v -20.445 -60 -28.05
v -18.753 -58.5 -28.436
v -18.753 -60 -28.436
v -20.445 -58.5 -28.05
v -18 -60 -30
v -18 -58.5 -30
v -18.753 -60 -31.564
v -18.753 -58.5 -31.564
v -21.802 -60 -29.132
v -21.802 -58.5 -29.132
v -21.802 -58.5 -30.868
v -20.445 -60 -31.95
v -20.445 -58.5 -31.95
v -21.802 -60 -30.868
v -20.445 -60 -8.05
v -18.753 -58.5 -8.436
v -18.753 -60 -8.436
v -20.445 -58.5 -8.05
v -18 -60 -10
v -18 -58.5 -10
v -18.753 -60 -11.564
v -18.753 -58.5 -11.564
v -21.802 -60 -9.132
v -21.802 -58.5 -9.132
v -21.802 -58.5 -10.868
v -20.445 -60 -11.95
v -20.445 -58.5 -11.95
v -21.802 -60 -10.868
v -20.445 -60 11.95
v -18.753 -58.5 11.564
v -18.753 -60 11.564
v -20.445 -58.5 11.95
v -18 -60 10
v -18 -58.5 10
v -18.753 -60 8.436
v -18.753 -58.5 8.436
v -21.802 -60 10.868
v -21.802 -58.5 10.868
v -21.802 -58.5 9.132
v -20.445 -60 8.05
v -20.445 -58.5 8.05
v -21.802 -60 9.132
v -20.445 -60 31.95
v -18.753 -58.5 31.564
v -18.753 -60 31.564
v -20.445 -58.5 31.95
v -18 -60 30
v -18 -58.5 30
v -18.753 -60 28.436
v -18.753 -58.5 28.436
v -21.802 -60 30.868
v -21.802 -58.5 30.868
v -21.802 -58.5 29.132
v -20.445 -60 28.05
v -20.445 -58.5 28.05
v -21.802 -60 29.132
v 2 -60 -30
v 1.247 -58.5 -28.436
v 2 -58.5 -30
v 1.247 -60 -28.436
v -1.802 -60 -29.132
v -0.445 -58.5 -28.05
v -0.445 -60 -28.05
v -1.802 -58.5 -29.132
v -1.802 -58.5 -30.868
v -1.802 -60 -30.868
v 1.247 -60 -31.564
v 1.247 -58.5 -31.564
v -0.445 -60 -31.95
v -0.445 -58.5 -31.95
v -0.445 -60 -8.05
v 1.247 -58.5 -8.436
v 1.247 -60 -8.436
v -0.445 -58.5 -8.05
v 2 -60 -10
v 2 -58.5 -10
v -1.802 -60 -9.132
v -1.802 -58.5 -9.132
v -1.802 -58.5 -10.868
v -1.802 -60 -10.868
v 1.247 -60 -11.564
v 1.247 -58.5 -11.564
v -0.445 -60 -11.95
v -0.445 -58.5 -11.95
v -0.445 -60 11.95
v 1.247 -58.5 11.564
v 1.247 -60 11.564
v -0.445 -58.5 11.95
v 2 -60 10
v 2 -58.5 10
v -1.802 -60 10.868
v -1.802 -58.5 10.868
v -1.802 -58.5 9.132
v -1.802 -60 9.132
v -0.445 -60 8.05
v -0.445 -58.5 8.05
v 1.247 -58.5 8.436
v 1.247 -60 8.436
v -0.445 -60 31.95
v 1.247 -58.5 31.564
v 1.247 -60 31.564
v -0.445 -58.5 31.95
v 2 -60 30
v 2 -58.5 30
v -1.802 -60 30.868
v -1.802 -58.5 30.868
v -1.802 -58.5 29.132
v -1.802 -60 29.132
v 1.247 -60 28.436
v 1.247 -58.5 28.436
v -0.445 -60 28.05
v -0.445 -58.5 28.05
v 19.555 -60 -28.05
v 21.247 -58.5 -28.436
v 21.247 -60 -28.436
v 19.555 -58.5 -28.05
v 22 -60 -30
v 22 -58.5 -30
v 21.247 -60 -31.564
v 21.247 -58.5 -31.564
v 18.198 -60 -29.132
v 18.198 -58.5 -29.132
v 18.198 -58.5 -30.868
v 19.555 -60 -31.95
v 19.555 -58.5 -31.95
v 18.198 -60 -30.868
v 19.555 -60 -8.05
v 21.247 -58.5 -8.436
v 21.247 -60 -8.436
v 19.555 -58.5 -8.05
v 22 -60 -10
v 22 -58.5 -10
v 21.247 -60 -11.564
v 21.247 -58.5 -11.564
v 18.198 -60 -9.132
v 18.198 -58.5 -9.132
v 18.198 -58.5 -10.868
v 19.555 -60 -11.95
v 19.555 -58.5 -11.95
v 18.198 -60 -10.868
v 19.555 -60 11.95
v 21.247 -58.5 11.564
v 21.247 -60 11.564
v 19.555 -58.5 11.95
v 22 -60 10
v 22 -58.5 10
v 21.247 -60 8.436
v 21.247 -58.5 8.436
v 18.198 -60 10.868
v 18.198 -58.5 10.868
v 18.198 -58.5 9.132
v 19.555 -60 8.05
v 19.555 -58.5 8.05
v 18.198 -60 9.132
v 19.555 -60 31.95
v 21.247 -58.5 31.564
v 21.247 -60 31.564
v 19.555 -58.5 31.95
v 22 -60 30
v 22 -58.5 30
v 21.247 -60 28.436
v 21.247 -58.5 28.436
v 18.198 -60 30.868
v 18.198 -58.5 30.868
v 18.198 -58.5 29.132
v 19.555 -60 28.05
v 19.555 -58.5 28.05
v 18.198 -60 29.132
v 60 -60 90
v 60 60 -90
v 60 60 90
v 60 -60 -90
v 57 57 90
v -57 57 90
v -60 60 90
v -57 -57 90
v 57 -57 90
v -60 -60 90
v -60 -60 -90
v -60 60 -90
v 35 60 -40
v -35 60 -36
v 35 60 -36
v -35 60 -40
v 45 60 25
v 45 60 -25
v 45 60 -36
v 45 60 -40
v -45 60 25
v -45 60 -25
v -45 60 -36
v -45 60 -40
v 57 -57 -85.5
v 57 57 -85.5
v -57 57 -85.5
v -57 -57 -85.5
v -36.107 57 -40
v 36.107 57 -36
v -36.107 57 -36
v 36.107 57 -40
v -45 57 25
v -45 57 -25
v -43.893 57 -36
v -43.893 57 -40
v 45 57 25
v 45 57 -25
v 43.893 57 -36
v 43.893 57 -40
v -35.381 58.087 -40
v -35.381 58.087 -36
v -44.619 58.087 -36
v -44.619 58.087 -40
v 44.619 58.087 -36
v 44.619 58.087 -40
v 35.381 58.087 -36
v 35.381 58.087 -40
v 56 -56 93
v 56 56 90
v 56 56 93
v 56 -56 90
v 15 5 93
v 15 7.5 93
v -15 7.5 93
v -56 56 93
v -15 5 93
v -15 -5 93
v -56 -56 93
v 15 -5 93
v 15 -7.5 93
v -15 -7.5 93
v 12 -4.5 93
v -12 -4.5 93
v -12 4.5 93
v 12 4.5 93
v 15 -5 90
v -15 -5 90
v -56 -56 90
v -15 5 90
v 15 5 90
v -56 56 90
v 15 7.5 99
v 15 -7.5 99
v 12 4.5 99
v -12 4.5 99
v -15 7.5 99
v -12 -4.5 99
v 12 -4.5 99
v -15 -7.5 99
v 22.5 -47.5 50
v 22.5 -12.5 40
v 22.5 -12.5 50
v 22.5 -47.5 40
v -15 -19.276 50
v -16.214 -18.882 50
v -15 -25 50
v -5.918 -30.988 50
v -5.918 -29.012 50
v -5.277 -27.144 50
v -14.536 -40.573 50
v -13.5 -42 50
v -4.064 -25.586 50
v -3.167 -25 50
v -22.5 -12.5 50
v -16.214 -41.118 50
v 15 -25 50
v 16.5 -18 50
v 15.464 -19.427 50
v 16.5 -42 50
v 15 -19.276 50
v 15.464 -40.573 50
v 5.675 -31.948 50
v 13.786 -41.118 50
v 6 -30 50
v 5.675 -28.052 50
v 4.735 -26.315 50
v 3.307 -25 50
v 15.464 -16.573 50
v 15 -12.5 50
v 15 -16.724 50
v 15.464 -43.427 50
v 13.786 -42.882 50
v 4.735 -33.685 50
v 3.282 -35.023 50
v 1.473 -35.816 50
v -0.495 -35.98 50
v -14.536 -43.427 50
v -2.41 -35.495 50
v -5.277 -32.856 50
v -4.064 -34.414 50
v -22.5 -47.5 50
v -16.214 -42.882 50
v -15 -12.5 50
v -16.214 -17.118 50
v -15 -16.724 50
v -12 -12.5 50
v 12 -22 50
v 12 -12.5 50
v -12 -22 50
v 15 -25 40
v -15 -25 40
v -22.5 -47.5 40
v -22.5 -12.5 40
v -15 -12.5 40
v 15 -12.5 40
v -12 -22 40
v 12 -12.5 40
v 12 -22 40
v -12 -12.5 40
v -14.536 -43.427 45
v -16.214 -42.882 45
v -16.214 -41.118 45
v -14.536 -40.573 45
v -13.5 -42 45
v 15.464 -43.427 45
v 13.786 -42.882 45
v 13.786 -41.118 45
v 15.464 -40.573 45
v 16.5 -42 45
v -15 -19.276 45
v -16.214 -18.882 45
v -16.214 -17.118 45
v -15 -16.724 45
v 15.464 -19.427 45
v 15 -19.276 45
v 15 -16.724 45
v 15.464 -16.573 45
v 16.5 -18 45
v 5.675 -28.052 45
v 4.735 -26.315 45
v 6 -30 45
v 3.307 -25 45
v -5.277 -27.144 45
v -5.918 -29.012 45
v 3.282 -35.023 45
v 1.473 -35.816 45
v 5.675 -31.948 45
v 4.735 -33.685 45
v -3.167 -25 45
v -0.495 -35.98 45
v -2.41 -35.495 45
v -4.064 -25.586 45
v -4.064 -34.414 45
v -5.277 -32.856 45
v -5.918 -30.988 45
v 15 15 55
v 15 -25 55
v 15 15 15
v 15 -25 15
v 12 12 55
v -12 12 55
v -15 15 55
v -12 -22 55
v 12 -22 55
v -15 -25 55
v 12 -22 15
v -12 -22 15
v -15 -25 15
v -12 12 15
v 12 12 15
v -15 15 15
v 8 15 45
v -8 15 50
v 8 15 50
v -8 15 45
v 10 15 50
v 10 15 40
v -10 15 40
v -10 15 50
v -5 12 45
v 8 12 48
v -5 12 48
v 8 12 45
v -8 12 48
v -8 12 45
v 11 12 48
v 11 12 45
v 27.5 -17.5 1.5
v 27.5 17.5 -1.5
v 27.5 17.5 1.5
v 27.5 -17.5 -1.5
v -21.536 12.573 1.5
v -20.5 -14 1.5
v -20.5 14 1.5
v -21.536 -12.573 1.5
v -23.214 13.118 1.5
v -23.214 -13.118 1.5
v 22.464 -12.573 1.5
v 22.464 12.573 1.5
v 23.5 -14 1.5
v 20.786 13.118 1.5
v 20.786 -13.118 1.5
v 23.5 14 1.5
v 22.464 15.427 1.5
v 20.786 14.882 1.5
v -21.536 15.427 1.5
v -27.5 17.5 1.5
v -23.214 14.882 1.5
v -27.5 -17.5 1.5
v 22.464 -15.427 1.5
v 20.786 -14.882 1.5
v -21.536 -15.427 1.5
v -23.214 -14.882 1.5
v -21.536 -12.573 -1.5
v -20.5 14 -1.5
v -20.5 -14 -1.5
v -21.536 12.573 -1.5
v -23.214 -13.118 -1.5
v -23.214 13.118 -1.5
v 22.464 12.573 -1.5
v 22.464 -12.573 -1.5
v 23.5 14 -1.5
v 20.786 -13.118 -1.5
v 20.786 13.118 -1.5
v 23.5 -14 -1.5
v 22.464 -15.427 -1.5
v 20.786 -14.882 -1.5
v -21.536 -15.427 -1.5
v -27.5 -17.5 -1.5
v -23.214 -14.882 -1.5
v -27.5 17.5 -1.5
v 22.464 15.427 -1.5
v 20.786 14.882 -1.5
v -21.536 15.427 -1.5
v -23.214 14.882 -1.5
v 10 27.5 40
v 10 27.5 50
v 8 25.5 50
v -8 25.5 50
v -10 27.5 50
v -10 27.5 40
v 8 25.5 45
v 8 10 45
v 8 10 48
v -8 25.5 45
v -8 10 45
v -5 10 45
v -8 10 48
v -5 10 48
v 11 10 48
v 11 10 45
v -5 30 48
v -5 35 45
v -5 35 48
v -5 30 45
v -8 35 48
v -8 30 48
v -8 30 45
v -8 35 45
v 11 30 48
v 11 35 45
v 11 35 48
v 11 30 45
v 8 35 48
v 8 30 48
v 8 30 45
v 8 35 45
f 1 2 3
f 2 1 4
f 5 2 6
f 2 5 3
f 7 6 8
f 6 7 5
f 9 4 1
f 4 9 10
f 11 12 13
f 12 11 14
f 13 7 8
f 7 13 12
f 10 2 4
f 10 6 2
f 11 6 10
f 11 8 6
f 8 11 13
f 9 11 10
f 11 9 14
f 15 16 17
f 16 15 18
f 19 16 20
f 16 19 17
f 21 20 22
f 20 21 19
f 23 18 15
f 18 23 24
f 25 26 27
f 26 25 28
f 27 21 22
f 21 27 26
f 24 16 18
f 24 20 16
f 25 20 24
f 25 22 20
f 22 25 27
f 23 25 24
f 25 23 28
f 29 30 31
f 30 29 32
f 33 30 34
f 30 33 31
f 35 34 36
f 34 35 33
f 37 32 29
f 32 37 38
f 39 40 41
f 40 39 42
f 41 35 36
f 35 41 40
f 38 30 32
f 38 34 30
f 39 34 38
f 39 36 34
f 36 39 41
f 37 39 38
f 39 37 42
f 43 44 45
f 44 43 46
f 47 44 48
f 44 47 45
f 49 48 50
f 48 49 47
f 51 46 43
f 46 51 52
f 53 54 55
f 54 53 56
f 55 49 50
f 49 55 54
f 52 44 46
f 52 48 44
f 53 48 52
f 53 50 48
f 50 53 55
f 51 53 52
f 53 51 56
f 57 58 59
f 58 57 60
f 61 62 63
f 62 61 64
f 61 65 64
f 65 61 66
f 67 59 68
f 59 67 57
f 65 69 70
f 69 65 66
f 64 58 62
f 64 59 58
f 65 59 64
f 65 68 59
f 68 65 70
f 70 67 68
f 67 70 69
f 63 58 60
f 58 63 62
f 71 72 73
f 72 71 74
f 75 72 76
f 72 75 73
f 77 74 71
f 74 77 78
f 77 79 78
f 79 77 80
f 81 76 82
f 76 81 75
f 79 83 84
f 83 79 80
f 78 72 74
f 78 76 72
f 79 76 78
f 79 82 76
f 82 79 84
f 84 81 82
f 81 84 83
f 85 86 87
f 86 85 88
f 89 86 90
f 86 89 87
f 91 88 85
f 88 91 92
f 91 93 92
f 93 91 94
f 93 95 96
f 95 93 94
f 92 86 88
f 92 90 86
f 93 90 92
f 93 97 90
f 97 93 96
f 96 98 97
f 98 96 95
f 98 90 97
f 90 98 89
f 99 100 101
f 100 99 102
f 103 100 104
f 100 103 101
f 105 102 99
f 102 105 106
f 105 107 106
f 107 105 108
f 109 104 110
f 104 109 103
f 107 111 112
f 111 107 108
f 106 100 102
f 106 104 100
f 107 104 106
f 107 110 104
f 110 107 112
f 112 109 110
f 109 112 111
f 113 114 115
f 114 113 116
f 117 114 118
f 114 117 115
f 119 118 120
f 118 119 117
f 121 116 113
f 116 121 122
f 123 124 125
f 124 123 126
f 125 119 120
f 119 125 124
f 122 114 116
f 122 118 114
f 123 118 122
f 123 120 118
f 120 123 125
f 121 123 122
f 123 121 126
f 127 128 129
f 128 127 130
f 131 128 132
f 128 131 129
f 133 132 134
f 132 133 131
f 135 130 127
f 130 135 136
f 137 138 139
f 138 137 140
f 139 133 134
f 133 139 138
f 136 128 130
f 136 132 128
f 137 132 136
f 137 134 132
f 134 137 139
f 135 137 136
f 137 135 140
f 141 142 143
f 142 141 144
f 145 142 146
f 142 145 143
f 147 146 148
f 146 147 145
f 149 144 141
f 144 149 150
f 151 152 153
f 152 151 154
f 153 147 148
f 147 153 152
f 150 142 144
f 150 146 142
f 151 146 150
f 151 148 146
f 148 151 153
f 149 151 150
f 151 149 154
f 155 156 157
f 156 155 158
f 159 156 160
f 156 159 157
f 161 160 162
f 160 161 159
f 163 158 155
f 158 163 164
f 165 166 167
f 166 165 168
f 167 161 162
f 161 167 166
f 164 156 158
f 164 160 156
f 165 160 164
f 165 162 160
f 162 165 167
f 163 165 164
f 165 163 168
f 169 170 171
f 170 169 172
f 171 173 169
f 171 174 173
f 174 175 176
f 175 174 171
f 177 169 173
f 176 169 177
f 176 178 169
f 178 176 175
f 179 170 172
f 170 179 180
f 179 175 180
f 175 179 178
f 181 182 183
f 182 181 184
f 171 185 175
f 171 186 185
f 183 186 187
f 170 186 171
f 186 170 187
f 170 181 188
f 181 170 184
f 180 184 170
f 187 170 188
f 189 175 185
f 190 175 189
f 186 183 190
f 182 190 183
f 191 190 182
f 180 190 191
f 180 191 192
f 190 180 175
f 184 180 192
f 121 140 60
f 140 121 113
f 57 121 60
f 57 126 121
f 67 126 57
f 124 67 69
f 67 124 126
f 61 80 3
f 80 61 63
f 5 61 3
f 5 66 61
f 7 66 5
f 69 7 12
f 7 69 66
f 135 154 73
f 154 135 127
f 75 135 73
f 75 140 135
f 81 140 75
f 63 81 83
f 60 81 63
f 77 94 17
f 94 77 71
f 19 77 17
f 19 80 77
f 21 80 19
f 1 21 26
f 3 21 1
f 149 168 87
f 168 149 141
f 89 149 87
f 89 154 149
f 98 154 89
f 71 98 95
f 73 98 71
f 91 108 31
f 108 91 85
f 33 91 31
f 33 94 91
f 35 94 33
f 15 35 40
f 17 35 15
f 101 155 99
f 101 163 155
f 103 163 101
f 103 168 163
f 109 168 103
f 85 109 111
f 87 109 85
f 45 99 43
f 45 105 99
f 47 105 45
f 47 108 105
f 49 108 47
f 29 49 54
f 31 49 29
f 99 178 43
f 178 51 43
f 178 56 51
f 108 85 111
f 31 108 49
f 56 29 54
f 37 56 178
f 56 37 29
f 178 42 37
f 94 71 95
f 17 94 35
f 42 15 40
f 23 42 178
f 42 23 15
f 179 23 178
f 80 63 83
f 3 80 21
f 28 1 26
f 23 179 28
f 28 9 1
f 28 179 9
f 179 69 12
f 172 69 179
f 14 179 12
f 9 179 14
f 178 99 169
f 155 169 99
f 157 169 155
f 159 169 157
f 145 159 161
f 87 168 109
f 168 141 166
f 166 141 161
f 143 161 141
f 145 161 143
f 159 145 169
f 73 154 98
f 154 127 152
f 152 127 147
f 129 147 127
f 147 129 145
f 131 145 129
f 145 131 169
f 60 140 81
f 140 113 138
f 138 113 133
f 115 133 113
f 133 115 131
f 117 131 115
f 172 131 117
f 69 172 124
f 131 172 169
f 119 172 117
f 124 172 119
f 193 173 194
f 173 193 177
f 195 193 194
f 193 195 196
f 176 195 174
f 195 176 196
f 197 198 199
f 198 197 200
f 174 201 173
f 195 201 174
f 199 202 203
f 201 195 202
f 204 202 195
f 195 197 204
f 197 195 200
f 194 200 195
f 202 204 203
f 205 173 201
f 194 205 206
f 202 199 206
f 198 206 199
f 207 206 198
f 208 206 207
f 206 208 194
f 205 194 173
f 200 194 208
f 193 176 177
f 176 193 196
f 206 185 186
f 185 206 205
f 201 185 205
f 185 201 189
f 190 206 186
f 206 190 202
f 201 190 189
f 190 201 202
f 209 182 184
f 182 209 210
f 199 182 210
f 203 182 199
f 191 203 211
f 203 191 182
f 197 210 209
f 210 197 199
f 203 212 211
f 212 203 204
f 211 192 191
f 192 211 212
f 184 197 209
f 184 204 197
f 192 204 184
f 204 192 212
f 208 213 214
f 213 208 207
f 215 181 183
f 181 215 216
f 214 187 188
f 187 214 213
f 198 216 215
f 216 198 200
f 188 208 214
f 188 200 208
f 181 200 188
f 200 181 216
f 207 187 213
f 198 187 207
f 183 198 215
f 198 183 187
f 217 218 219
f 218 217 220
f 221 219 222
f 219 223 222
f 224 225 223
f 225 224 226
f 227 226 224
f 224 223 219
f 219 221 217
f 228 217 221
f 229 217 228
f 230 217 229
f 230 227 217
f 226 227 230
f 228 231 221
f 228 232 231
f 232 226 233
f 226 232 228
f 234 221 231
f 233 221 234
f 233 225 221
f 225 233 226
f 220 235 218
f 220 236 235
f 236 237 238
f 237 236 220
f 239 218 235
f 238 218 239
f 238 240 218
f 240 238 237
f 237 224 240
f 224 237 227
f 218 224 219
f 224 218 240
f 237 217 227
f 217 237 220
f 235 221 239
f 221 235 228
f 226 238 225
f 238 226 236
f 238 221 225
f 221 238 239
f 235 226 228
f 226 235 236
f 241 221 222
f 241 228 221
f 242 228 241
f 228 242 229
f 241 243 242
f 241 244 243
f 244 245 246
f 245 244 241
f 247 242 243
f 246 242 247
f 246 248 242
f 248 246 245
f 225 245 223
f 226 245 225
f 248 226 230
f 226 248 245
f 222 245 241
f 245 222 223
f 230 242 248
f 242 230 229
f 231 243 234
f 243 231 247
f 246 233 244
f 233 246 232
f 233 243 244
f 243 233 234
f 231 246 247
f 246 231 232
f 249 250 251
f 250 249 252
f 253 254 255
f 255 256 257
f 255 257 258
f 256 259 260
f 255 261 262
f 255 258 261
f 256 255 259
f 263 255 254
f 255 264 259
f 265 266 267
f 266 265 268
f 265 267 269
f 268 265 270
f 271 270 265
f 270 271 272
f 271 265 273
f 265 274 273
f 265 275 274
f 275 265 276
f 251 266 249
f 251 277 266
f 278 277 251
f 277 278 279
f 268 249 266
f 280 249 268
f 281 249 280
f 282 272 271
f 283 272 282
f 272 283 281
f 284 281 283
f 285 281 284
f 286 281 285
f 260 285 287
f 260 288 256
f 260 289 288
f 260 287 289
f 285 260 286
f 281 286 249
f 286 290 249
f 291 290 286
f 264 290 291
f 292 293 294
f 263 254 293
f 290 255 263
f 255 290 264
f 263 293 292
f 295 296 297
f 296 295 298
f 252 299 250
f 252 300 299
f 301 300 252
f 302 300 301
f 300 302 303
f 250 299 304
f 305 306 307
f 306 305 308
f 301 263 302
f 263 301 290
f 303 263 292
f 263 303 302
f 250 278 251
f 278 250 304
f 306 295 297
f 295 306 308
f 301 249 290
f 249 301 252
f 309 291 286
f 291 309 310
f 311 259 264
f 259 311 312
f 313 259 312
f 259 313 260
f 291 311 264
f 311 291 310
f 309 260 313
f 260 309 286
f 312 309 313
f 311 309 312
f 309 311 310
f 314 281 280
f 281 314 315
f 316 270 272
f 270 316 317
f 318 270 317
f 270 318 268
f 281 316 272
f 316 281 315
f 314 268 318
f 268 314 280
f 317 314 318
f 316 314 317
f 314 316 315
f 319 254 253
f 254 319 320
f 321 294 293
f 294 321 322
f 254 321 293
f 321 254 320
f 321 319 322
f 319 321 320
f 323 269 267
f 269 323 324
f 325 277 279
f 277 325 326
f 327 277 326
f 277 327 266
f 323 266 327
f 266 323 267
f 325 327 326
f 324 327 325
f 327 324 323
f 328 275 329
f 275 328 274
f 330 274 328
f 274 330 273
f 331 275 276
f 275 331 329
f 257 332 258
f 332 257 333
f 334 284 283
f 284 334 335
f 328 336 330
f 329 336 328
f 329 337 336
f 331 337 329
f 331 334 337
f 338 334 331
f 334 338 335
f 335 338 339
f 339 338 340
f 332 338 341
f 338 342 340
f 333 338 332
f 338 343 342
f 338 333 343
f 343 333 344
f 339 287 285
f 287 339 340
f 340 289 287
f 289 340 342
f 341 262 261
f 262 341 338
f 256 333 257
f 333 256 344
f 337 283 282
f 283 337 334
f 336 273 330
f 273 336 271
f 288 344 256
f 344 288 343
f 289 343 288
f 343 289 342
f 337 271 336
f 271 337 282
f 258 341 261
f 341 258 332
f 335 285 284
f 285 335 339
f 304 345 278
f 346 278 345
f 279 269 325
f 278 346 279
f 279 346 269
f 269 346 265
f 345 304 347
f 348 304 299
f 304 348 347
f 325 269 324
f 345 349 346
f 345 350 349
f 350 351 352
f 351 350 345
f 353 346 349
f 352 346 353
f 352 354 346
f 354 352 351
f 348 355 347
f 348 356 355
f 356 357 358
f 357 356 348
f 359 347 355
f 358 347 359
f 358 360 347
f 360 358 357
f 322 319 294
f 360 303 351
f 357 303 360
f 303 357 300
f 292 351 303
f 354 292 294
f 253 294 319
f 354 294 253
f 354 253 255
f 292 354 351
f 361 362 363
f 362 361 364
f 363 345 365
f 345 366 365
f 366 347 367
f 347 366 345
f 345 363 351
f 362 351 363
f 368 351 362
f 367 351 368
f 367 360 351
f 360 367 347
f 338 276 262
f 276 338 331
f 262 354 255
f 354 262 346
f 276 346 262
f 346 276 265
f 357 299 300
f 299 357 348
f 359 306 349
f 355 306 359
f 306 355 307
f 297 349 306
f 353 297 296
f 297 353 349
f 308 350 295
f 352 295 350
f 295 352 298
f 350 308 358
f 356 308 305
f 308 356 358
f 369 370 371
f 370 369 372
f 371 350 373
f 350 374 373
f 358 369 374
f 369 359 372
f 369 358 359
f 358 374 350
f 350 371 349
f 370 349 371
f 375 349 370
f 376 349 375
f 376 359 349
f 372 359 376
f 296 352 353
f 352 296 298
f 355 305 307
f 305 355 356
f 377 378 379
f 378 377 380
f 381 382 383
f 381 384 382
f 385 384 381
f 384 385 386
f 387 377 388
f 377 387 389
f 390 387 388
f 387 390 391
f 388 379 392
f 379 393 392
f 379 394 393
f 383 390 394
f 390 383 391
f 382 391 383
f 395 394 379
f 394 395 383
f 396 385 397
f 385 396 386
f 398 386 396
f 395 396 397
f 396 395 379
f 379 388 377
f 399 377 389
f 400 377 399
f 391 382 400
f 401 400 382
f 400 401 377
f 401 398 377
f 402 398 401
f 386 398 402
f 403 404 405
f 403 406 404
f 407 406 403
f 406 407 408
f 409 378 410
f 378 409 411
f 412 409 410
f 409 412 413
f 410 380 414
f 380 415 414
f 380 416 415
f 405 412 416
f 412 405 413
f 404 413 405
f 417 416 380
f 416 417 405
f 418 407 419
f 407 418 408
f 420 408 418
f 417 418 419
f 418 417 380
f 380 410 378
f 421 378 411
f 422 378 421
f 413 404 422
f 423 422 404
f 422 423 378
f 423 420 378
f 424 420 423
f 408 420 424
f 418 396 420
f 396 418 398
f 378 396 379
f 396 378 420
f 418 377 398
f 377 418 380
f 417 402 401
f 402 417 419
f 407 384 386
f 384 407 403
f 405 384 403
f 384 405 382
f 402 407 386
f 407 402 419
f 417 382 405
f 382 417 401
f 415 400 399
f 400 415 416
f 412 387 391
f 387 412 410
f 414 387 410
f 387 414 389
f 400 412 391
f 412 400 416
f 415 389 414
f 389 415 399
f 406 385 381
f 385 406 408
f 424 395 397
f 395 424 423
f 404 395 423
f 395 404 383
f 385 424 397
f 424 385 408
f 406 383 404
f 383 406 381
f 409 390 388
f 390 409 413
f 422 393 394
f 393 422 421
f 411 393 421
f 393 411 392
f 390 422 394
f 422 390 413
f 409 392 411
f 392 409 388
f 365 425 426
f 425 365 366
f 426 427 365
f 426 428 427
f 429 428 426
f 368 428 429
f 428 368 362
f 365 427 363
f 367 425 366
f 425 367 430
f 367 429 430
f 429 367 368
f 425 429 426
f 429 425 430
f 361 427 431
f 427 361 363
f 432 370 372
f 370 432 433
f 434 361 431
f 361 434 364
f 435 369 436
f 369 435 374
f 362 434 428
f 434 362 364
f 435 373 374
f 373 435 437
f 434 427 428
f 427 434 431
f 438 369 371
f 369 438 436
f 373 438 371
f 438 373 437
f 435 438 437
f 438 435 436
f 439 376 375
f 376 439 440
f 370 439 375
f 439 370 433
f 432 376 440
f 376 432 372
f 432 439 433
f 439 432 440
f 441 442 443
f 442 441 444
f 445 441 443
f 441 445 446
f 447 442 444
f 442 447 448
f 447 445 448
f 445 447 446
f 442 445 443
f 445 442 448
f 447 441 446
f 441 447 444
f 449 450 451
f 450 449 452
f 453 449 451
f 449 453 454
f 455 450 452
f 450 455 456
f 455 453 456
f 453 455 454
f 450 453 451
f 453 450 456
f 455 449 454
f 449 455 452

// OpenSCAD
/**
 * Smart Pet Feeder - 3D Enclosure Design
 * OpenSCAD script
 * 
 * Features:
 * - Motor mount for SG90 servo
 * - Ultrasonic sensor mount
 * - ESP32 microcontroller placement
 * - Bowl housing
 * - Removable lid
 * - Modular design for basic/advanced modes
 */

// ============== PARAMETERS ==============
// Adjust these to tune the design
FEEDER_WIDTH = 120;    // mm
FEEDER_DEPTH = 120;    // mm
FEEDER_HEIGHT = 180;   // mm
WALL_THICKNESS = 3;    // mm
BOWL_DIAMETER = 80;    // mm
BOWL_DEPTH = 30;       // mm

// ============== MOTOR MOUNT ==============
module motor_mount() {
  // Servo mount plate
  translate([0, 0, 0]) {
    difference() {
      // Main mount block
      cube([45, 35, 10], center = true);
      
      // Screw holes (M3)
      translate([-15, -12, 5]) cylinder(r = 1.5, h = 10, center = true);
      translate([15, -12, 5]) cylinder(r = 1.5, h = 10, center = true);
      translate([-15, 12, 5]) cylinder(r = 1.5, h = 10, center = true);
      translate([15, 12, 5]) cylinder(r = 1.5, h = 10, center = true);
      
      // Servo shaft hole
      translate([0, 0, 5]) cylinder(r = 6, h = 10, center = true);
    }
  }
  
  // Dispenser chute
  translate([0, 25, -10]) {
    difference() {
      cube([30, 40, 40], center = true);
      cube([24, 34, 50], center = true);
    }
  }
}

// ============== ULTRASONIC SENSOR MOUNT ==============
module sensor_mount() {
  // Sensor housing
  difference() {
    cube([20, 15, 10], center = true);
    // Sensor cutout
    translate([0, 0, 5]) cube([16, 11, 10], center = true);
  }
  
  // Mounting tabs
  translate([-8, -10, 0]) cube([3, 5, 3]);
  translate([8, -10, 0]) cube([3, 5, 3]);
  translate([-8, 10, 0]) cube([3, 5, 3]);
  translate([8, 10, 0]) cube([3, 5, 3]);
}

// ============== ESP32 MOUNT ==============
module esp32_mount() {
  // Base plate
  difference() {
    cube([55, 35, 3], center = true);
    
    // Mounting holes
    translate([-22, -14, 0]) cylinder(r = 1.5, h = 5, center = true);
    translate([22, -14, 0]) cylinder(r = 1.5, h = 5, center = true);
    translate([-22, 14, 0]) cylinder(r = 1.5, h = 5, center = true);
    translate([22, 14, 0]) cylinder(r = 1.5, h = 5, center = true);
  }
}

// ============== FOOD BOWL ==============
module food_bowl() {
  // Bowl outer
  difference() {
    cylinder(r = BOWL_DIAMETER / 2, h = BOWL_DEPTH, center = true);
    // Inner cavity
    cylinder(r = BOWL_DIAMETER / 2 - WALL_THICKNESS, h = BOWL_DEPTH + 1, center = true);
  }
}

// ============== MAIN ENCLOSURE ==============
module main_enclosure() {
  difference() {
    // Outer shell
    cube([FEEDER_WIDTH, FEEDER_DEPTH, FEEDER_HEIGHT], center = true);
    
    // Inner cavity
    translate([0, 0, WALL_THICKNESS]) {
      cube([
        FEEDER_WIDTH - 2 * WALL_THICKNESS,
        FEEDER_DEPTH - 2 * WALL_THICKNESS,
        FEEDER_HEIGHT - WALL_THICKNESS
      ], center = true);
    }
    
    // Lid opening (top)
    translate([0, 0, FEEDER_HEIGHT / 2 - 5]) {
      cube([FEEDER_WIDTH - 10, FEEDER_DEPTH - 10, 10], center = true);
    }
    
    // Bowl opening (front)
    translate([0, FEEDER_DEPTH / 2 - WALL_THICKNESS, 0]) {
      cube([BOWL_DIAMETER + 10, 10, BOWL_DEPTH + 20], center = true);
    }
    
    // Ventilation holes
    for (i = [-20, 0, 20]) {
      for (j = [-30, -10, 10, 30]) {
        translate([i, -FEEDER_DEPTH / 2 + WALL_THICKNESS / 2, j]) {
          rotate([90, 0, 0]) cylinder(r = 2, h = WALL_THICKNESS + 1);
        }
      }
    }
    
    // Cable grommets
    translate([-40, FEEDER_DEPTH / 2, -40]) cylinder(r = 5, h = WALL_THICKNESS + 1);
    translate([40, FEEDER_DEPTH / 2, -40]) cylinder(r = 5, h = WALL_THICKNESS + 1);
  }
}

// ============== REMOVABLE LID ==============
module removable_lid() {
  // Lid plate
  difference() {
    cube([FEEDER_WIDTH - 8, FEEDER_DEPTH - 8, WALL_THICKNESS], center = true);
    
    // Handle cutout
    translate([0, 0, 0]) cube([30, 10, WALL_THICKNESS + 2], center = true);
  }
  
  // Handle
  translate([0, 0, WALL_THICKNESS / 2 + 3]) {
    difference() {
      cube([30, 15, 6], center = true);
      cube([24, 9, 10], center = true);
    }
  }
}

// ============== ASSEMBLY VIEW ==============
module assembly() {
  // Main enclosure
  color([0.8, 0.8, 0.8]) main_enclosure();
  
  // Lid
  color([0.7, 0.7, 0.7]) translate([0, 0, FEEDER_HEIGHT / 2 + WALL_THICKNESS / 2]) {
    removable_lid();
  }
  
  // Motor mount (positioned in upper section)
  color([0.3, 0.3, 0.3]) translate([0, -FEEDER_DEPTH / 4, FEEDER_HEIGHT / 4]) {
    motor_mount();
  }
  
  // ESP32 mount (positioned in upper back)
  color([0.2, 0.2, 0.5]) translate([0, -FEEDER_DEPTH / 4 + 30, 0]) {
    esp32_mount();
  }
  
  // Sensor mount (positioned in upper front)
  color([0.2, 0.2, 0.2]) translate([0, FEEDER_DEPTH / 4 - 10, FEEDER_HEIGHT / 4]) {
    sensor_mount();
  }
}

// Render the assembly
assembly();

// ============== PRINT-FRIENDLY SEPARATE PARTS ==============
// Uncomment to render individual parts:

//* translate([0, 80, 0]) motor_mount();
//* translate([80, 80, 0]) sensor_mount();
//* translate([0, 0, 0]) esp32_mount();
//* translate([80, 0, 0]) removable_lid();

// ============== DIMENSIONS FOR ASSEMBLY ==============
echo("Feeder Dimensions:");
echo(str("Width: ", FEEDER_WIDTH, "mm"));
echo(str("Depth: ", FEEDER_DEPTH, "mm"));
echo(str("Height: ", FEEDER_HEIGHT, "mm"));
echo(str("Bowl Diameter: ", BOWL_DIAMETER, "mm"));
